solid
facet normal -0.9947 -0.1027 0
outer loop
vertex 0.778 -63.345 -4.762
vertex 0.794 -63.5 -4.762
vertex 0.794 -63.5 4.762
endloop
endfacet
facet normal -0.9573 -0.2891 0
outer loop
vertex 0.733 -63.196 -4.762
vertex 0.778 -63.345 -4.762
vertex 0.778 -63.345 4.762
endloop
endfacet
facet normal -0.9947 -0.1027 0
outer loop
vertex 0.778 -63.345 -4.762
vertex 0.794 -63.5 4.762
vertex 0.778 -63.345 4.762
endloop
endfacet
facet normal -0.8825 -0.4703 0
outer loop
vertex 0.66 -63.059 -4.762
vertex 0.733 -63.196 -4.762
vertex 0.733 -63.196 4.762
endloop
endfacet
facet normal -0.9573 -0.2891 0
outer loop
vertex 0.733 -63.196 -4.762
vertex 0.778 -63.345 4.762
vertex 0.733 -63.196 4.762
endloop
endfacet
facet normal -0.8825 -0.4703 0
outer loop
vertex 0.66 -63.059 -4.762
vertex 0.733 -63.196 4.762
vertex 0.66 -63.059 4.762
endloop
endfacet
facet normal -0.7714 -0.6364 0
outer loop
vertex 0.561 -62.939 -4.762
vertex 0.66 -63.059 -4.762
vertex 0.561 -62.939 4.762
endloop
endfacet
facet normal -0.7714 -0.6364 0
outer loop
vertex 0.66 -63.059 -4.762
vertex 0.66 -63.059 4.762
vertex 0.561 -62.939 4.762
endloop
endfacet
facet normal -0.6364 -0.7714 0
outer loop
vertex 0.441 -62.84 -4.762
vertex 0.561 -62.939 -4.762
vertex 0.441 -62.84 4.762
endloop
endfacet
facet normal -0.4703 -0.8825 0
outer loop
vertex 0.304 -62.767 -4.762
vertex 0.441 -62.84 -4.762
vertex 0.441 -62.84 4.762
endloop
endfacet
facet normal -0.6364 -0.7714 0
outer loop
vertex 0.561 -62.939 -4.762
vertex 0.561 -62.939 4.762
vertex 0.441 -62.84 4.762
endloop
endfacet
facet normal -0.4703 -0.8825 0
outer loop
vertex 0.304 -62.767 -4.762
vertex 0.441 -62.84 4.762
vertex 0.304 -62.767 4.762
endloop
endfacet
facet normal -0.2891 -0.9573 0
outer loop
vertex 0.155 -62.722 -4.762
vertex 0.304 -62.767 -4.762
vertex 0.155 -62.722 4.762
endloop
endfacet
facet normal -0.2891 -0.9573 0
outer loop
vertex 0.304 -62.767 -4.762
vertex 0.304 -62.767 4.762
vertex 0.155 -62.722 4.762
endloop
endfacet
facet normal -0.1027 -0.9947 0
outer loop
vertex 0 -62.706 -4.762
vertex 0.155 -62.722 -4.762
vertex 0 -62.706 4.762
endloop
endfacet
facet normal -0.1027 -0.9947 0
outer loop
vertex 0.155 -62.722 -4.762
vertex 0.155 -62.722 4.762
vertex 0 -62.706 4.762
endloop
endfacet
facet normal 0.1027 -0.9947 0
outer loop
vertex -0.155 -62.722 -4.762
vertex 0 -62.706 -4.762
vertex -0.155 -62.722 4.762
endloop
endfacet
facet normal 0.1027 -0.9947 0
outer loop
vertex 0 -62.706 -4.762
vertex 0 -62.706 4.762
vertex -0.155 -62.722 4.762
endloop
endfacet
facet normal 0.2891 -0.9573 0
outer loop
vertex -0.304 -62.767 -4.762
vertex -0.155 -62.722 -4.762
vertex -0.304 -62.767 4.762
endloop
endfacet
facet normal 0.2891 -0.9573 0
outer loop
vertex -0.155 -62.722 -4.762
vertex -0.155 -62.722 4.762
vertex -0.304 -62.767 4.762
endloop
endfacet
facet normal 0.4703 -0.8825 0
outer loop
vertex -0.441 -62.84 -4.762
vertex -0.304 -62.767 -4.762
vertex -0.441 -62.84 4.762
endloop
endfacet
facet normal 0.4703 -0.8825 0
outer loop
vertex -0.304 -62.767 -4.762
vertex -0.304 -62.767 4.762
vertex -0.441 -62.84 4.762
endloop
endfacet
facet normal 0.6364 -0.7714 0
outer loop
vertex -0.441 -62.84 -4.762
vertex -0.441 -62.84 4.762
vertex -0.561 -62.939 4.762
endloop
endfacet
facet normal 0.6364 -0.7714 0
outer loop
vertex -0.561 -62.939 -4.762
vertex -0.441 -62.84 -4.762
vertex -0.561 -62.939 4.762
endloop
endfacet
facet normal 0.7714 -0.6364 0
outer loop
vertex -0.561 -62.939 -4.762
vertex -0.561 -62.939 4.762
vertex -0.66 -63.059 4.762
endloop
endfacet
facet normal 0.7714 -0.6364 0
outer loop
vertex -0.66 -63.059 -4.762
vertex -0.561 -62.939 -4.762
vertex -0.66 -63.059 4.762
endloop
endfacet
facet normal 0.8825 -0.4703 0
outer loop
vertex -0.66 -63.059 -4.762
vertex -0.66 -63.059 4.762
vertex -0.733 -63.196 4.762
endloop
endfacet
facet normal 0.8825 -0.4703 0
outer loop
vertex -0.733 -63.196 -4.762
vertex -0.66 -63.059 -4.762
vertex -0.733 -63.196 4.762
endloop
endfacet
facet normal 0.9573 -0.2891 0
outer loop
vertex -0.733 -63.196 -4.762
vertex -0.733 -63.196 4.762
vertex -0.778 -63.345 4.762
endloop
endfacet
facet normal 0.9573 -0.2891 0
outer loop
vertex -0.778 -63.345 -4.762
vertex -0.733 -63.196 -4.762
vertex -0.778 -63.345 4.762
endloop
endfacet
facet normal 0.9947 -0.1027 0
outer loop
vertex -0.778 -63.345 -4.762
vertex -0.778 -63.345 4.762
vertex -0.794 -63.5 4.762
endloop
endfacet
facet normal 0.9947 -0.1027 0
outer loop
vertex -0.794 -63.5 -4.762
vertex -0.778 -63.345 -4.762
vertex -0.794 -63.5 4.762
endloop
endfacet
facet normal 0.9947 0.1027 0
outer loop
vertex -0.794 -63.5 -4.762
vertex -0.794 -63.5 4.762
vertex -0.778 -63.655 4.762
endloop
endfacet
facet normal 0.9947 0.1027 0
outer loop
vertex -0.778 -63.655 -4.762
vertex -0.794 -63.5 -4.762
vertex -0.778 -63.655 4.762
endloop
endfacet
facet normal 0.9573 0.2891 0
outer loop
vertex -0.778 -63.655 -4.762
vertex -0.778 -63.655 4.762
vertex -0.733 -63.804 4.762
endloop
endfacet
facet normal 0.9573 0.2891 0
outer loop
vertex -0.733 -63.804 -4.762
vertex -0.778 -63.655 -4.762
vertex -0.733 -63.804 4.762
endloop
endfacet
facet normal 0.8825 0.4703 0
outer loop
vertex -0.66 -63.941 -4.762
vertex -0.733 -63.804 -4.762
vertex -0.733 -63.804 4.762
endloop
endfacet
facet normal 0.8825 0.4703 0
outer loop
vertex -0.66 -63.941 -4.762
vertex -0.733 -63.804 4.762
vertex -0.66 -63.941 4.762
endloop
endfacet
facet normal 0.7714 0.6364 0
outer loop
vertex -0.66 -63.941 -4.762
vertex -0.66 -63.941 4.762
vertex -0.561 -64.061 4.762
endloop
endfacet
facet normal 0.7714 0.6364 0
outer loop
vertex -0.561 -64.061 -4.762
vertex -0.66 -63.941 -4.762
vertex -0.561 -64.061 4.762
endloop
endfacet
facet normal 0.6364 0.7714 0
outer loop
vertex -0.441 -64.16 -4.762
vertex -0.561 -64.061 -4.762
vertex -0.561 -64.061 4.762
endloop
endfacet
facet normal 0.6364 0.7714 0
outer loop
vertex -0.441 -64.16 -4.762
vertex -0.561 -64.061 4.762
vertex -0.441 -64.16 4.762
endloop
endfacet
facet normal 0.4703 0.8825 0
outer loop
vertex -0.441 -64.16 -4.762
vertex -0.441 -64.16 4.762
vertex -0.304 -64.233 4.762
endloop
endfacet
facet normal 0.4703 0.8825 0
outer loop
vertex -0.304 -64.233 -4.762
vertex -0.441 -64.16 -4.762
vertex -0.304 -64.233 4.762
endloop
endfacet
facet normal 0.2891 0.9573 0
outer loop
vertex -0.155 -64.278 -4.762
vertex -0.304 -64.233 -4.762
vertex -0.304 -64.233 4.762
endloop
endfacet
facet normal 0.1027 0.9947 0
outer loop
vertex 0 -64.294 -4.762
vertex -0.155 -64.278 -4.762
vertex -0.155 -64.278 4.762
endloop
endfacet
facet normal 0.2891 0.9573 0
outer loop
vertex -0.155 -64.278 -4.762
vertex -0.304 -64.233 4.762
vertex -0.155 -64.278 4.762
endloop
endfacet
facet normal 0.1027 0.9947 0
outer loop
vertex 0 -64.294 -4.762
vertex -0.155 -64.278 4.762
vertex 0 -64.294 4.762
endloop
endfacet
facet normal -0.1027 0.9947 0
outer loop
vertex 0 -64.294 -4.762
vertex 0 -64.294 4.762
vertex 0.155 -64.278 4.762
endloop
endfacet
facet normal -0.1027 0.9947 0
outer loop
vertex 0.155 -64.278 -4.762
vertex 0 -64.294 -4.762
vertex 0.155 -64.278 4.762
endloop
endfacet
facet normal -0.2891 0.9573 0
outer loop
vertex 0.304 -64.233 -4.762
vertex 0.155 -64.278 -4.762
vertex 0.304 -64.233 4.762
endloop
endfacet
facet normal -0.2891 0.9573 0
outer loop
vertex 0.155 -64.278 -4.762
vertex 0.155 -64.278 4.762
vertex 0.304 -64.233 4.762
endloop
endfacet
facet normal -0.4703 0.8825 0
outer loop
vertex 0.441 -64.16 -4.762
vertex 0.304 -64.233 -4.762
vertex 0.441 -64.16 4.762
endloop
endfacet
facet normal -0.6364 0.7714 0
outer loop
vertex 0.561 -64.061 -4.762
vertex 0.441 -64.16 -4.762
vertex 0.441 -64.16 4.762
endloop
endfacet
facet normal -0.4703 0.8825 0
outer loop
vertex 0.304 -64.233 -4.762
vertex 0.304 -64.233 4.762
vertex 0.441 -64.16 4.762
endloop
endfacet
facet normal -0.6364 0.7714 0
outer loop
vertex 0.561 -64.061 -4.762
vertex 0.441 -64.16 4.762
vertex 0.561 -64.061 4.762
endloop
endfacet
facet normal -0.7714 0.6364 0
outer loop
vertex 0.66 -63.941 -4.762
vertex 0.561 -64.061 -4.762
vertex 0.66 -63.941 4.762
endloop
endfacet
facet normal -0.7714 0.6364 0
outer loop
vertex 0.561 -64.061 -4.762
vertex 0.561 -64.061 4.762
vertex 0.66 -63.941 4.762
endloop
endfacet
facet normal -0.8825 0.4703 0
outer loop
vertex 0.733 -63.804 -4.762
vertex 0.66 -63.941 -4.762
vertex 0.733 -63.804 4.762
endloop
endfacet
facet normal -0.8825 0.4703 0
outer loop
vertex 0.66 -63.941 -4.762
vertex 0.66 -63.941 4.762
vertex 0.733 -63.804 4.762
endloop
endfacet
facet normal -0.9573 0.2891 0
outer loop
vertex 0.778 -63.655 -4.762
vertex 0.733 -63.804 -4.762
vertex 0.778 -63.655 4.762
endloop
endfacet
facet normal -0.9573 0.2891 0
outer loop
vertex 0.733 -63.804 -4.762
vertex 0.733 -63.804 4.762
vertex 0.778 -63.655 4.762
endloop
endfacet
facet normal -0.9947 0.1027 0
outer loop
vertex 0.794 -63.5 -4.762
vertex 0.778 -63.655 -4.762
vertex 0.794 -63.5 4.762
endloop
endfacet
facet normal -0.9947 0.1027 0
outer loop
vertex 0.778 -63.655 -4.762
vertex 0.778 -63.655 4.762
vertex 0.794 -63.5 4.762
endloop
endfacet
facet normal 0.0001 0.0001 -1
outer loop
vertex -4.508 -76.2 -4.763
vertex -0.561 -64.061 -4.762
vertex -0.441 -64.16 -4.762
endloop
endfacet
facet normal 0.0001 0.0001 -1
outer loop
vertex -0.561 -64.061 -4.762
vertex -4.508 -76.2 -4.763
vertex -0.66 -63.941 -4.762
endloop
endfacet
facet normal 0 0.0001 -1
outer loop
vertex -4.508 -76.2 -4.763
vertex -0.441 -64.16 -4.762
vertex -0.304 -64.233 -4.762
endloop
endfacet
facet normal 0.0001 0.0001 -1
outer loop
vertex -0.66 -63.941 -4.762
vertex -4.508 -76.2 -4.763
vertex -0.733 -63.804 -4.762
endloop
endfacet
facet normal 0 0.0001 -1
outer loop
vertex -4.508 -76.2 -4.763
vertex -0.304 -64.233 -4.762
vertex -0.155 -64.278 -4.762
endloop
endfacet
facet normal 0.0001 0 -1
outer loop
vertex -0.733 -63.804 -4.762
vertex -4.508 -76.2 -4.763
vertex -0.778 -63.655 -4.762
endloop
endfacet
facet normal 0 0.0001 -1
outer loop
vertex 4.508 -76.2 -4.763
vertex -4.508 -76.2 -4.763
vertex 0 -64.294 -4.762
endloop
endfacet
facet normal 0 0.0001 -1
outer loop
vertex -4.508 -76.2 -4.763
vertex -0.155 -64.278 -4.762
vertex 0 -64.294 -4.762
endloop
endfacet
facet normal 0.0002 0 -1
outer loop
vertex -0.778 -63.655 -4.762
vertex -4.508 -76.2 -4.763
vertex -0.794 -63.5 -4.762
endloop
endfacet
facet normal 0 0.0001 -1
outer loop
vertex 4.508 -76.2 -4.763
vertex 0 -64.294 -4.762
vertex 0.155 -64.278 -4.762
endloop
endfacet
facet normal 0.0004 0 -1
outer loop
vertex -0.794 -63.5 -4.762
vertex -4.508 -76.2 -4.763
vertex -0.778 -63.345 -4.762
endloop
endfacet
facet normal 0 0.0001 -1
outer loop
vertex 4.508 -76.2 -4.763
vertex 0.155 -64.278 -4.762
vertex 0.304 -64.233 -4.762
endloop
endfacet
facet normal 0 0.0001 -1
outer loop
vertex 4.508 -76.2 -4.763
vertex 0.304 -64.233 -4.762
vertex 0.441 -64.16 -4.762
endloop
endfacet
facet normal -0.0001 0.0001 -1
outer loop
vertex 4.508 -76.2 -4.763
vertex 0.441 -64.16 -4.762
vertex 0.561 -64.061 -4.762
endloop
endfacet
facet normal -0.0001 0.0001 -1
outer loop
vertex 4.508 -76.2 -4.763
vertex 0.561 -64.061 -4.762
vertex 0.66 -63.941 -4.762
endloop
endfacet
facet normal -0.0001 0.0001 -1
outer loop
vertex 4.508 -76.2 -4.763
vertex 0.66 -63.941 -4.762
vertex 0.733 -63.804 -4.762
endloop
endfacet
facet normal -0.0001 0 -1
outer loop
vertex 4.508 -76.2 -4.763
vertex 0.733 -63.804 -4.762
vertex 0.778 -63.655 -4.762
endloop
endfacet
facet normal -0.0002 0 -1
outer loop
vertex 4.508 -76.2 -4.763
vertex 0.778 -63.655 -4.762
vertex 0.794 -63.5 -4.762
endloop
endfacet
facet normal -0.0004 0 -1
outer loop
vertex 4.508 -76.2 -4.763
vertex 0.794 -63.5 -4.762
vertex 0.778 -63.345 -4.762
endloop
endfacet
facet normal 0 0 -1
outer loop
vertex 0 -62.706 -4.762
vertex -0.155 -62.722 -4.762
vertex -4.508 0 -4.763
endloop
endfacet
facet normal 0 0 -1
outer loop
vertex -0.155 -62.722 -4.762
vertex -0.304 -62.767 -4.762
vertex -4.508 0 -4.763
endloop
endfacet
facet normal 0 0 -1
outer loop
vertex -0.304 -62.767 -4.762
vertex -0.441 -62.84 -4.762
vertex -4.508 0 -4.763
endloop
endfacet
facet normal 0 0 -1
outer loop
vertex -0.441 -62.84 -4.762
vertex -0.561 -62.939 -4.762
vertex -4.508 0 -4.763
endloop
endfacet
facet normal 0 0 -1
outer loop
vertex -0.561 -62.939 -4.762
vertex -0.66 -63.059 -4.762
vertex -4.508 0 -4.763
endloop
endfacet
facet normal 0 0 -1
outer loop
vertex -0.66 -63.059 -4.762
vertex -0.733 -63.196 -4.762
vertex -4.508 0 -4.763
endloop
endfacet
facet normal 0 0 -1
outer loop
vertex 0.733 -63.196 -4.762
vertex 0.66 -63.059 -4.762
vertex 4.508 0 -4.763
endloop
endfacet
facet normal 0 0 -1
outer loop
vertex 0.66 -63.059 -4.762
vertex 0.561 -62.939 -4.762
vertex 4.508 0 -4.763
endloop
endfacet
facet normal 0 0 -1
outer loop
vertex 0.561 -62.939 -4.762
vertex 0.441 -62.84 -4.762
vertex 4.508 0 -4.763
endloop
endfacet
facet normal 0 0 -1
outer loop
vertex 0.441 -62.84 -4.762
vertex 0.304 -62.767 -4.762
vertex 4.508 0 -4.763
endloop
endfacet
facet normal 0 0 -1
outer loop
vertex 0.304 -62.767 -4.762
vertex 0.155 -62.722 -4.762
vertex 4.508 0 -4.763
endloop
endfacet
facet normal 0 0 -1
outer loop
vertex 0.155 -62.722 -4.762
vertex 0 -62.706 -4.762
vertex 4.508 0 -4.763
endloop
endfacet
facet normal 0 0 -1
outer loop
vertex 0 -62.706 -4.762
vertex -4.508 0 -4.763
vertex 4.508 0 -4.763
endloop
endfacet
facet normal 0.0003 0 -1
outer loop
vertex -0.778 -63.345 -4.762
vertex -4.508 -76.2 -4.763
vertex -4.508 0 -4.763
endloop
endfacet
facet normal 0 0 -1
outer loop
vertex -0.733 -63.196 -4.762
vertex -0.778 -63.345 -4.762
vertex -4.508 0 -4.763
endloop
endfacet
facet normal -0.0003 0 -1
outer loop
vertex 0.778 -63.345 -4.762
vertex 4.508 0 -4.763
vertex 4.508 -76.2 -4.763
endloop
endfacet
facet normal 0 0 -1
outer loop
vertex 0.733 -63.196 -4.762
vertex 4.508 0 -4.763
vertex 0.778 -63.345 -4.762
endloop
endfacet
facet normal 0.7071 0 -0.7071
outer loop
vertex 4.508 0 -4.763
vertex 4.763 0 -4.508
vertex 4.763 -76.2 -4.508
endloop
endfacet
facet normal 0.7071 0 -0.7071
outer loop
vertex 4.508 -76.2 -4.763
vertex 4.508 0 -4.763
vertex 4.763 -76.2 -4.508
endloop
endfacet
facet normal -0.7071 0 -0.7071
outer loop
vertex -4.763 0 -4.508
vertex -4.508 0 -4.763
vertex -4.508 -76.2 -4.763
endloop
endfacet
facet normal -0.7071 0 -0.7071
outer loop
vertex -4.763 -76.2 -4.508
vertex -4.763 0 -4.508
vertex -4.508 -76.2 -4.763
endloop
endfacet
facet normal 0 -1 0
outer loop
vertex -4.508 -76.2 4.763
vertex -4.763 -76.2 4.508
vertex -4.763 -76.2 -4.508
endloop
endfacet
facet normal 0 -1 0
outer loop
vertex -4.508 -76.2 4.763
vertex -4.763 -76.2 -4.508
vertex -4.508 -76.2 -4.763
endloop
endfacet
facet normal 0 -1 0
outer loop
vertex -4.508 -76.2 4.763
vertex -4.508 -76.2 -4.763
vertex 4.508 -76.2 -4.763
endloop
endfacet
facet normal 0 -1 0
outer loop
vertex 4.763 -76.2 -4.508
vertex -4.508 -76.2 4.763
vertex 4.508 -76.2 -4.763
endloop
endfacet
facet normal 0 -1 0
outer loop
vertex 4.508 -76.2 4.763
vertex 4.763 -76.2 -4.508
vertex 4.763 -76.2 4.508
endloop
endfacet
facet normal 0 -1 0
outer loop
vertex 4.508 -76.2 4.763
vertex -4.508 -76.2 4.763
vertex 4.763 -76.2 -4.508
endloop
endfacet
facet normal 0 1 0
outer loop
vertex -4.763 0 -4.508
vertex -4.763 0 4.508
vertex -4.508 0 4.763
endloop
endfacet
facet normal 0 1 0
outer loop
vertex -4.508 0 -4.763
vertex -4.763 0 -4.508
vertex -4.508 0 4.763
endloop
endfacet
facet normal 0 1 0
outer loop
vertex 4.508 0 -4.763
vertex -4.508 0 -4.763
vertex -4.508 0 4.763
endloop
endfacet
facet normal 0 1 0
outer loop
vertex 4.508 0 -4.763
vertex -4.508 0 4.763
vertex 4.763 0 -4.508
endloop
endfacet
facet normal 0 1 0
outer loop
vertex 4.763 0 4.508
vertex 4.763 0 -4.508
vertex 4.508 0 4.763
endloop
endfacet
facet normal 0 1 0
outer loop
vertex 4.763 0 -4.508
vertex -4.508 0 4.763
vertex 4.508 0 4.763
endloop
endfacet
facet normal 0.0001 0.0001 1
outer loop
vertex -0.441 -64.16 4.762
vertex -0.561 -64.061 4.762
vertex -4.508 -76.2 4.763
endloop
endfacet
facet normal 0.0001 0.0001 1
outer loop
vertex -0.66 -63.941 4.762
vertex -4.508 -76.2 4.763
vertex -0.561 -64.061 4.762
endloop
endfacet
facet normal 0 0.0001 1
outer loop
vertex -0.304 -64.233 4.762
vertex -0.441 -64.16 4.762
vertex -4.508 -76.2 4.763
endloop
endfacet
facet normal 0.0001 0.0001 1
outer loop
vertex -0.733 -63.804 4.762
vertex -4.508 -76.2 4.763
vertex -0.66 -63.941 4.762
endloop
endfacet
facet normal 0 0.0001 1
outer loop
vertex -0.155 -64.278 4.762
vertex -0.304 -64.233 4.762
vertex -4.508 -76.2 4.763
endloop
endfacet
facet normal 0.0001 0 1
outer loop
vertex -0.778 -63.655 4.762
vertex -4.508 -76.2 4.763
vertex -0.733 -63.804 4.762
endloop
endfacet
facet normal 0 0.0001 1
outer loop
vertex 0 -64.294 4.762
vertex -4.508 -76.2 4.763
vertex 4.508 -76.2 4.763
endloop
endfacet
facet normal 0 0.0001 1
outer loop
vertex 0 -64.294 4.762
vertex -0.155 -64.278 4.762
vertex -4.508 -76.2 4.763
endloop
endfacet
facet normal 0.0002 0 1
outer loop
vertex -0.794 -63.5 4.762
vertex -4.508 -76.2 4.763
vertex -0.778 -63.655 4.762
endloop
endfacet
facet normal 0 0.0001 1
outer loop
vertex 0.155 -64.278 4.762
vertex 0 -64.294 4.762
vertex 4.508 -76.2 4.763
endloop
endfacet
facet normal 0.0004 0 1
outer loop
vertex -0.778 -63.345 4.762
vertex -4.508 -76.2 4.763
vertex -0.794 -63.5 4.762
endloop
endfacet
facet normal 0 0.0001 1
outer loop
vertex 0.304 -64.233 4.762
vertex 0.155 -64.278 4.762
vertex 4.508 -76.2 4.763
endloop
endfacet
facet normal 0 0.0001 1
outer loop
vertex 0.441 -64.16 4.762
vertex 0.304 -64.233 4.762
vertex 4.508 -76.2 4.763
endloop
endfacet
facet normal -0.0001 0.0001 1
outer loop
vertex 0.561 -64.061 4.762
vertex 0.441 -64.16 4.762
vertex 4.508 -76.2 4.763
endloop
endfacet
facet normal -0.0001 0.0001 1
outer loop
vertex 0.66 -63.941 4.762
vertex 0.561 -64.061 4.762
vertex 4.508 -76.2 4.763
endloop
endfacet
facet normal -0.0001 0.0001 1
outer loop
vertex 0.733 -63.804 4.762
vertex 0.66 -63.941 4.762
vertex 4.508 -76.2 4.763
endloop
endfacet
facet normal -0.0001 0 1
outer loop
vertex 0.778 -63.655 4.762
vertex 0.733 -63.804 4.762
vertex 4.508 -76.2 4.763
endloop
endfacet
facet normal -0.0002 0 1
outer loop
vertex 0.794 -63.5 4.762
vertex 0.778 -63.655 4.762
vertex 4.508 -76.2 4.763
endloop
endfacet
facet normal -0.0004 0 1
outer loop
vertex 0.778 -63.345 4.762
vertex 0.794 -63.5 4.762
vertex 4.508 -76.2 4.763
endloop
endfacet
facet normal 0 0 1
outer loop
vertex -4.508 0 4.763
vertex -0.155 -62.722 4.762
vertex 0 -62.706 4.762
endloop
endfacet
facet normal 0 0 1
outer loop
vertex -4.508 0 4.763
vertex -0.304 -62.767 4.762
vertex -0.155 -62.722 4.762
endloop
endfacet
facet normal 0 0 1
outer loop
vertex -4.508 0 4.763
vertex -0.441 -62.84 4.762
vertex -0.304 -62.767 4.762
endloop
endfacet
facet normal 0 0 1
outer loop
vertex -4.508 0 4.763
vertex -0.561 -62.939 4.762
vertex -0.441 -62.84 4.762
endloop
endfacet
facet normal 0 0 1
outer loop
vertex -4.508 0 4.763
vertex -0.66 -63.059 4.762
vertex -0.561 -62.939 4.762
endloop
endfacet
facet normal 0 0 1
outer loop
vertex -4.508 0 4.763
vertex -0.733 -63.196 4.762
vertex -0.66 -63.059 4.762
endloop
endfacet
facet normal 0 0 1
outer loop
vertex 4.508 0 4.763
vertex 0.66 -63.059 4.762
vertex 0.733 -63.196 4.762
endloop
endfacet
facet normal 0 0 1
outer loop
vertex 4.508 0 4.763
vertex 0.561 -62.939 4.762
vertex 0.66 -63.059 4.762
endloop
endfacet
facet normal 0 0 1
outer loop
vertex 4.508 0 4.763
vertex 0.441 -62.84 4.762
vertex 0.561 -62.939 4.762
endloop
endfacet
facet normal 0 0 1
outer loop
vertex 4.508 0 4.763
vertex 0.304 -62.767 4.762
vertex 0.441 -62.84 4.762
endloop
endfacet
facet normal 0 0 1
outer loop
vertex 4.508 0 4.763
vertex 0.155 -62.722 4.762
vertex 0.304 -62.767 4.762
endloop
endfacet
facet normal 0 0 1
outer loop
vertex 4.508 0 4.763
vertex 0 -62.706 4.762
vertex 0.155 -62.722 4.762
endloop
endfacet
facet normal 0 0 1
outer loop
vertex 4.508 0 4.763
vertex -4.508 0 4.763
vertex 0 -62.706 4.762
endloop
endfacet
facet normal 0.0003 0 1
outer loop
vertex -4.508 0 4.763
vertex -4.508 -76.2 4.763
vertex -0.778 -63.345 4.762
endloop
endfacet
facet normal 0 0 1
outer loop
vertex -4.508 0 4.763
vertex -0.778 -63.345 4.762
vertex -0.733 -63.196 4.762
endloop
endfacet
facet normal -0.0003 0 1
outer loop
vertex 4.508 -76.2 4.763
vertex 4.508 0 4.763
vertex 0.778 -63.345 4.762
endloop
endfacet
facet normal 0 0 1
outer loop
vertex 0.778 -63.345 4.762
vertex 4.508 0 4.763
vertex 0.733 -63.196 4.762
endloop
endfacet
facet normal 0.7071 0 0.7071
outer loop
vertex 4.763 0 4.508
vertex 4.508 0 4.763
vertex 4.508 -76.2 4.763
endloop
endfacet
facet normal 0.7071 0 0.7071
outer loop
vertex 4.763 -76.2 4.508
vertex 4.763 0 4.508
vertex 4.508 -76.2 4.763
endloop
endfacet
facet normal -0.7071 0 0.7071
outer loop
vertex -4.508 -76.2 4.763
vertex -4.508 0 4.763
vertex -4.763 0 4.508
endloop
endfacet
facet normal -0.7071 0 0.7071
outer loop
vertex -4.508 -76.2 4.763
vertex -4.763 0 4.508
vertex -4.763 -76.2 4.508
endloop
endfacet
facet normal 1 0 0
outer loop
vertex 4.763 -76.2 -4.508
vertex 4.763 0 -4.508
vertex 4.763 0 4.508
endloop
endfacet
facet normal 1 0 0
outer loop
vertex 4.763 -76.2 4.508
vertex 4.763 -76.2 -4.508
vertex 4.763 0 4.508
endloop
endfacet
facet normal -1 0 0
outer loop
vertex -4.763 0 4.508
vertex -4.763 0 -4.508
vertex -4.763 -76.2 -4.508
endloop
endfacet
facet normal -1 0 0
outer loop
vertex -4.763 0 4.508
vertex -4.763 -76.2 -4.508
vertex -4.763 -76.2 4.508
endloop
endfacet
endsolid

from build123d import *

# Parameters (mm, degrees)
F0_W     = 9.525
F0_H     = 9.525
F1_DEPTH = 76.2
F2_SIZE  = 0.254
F4_DEPTH = 25.4


with BuildPart() as f1:
    # F0 (on Front) → F1 (new body)
    with BuildSketch(Plane.XZ):
        Rectangle(F0_W, F0_H)
    extrude(amount=F1_DEPTH)

    # F2
    f2_edges = [f1.edges().sort_by_distance(p)[0] for p in [
        (-4.7625, -38.1, 4.7625),
        (-4.7625, -38.1, -4.7625),
        (4.7625, -38.1, 4.7625),
        (4.7625, -38.1, -4.7625),
    ]]
    chamfer(f2_edges, length=F2_SIZE)

    # F3 (on face) → F4 (cut)
    with BuildSketch(Plane.XY.offset(4.7625)):
        with BuildLine():
            ThreePointArc((0, -64.29375), (0.561266, -64.061266), (0.79375, -63.5))
            ThreePointArc((0.79375, -63.5), (-0.561266, -62.938734), (0, -64.29375))
        make_face()
    extrude(amount=-F4_DEPTH, mode=Mode.SUBTRACT)


solid = f1.part
